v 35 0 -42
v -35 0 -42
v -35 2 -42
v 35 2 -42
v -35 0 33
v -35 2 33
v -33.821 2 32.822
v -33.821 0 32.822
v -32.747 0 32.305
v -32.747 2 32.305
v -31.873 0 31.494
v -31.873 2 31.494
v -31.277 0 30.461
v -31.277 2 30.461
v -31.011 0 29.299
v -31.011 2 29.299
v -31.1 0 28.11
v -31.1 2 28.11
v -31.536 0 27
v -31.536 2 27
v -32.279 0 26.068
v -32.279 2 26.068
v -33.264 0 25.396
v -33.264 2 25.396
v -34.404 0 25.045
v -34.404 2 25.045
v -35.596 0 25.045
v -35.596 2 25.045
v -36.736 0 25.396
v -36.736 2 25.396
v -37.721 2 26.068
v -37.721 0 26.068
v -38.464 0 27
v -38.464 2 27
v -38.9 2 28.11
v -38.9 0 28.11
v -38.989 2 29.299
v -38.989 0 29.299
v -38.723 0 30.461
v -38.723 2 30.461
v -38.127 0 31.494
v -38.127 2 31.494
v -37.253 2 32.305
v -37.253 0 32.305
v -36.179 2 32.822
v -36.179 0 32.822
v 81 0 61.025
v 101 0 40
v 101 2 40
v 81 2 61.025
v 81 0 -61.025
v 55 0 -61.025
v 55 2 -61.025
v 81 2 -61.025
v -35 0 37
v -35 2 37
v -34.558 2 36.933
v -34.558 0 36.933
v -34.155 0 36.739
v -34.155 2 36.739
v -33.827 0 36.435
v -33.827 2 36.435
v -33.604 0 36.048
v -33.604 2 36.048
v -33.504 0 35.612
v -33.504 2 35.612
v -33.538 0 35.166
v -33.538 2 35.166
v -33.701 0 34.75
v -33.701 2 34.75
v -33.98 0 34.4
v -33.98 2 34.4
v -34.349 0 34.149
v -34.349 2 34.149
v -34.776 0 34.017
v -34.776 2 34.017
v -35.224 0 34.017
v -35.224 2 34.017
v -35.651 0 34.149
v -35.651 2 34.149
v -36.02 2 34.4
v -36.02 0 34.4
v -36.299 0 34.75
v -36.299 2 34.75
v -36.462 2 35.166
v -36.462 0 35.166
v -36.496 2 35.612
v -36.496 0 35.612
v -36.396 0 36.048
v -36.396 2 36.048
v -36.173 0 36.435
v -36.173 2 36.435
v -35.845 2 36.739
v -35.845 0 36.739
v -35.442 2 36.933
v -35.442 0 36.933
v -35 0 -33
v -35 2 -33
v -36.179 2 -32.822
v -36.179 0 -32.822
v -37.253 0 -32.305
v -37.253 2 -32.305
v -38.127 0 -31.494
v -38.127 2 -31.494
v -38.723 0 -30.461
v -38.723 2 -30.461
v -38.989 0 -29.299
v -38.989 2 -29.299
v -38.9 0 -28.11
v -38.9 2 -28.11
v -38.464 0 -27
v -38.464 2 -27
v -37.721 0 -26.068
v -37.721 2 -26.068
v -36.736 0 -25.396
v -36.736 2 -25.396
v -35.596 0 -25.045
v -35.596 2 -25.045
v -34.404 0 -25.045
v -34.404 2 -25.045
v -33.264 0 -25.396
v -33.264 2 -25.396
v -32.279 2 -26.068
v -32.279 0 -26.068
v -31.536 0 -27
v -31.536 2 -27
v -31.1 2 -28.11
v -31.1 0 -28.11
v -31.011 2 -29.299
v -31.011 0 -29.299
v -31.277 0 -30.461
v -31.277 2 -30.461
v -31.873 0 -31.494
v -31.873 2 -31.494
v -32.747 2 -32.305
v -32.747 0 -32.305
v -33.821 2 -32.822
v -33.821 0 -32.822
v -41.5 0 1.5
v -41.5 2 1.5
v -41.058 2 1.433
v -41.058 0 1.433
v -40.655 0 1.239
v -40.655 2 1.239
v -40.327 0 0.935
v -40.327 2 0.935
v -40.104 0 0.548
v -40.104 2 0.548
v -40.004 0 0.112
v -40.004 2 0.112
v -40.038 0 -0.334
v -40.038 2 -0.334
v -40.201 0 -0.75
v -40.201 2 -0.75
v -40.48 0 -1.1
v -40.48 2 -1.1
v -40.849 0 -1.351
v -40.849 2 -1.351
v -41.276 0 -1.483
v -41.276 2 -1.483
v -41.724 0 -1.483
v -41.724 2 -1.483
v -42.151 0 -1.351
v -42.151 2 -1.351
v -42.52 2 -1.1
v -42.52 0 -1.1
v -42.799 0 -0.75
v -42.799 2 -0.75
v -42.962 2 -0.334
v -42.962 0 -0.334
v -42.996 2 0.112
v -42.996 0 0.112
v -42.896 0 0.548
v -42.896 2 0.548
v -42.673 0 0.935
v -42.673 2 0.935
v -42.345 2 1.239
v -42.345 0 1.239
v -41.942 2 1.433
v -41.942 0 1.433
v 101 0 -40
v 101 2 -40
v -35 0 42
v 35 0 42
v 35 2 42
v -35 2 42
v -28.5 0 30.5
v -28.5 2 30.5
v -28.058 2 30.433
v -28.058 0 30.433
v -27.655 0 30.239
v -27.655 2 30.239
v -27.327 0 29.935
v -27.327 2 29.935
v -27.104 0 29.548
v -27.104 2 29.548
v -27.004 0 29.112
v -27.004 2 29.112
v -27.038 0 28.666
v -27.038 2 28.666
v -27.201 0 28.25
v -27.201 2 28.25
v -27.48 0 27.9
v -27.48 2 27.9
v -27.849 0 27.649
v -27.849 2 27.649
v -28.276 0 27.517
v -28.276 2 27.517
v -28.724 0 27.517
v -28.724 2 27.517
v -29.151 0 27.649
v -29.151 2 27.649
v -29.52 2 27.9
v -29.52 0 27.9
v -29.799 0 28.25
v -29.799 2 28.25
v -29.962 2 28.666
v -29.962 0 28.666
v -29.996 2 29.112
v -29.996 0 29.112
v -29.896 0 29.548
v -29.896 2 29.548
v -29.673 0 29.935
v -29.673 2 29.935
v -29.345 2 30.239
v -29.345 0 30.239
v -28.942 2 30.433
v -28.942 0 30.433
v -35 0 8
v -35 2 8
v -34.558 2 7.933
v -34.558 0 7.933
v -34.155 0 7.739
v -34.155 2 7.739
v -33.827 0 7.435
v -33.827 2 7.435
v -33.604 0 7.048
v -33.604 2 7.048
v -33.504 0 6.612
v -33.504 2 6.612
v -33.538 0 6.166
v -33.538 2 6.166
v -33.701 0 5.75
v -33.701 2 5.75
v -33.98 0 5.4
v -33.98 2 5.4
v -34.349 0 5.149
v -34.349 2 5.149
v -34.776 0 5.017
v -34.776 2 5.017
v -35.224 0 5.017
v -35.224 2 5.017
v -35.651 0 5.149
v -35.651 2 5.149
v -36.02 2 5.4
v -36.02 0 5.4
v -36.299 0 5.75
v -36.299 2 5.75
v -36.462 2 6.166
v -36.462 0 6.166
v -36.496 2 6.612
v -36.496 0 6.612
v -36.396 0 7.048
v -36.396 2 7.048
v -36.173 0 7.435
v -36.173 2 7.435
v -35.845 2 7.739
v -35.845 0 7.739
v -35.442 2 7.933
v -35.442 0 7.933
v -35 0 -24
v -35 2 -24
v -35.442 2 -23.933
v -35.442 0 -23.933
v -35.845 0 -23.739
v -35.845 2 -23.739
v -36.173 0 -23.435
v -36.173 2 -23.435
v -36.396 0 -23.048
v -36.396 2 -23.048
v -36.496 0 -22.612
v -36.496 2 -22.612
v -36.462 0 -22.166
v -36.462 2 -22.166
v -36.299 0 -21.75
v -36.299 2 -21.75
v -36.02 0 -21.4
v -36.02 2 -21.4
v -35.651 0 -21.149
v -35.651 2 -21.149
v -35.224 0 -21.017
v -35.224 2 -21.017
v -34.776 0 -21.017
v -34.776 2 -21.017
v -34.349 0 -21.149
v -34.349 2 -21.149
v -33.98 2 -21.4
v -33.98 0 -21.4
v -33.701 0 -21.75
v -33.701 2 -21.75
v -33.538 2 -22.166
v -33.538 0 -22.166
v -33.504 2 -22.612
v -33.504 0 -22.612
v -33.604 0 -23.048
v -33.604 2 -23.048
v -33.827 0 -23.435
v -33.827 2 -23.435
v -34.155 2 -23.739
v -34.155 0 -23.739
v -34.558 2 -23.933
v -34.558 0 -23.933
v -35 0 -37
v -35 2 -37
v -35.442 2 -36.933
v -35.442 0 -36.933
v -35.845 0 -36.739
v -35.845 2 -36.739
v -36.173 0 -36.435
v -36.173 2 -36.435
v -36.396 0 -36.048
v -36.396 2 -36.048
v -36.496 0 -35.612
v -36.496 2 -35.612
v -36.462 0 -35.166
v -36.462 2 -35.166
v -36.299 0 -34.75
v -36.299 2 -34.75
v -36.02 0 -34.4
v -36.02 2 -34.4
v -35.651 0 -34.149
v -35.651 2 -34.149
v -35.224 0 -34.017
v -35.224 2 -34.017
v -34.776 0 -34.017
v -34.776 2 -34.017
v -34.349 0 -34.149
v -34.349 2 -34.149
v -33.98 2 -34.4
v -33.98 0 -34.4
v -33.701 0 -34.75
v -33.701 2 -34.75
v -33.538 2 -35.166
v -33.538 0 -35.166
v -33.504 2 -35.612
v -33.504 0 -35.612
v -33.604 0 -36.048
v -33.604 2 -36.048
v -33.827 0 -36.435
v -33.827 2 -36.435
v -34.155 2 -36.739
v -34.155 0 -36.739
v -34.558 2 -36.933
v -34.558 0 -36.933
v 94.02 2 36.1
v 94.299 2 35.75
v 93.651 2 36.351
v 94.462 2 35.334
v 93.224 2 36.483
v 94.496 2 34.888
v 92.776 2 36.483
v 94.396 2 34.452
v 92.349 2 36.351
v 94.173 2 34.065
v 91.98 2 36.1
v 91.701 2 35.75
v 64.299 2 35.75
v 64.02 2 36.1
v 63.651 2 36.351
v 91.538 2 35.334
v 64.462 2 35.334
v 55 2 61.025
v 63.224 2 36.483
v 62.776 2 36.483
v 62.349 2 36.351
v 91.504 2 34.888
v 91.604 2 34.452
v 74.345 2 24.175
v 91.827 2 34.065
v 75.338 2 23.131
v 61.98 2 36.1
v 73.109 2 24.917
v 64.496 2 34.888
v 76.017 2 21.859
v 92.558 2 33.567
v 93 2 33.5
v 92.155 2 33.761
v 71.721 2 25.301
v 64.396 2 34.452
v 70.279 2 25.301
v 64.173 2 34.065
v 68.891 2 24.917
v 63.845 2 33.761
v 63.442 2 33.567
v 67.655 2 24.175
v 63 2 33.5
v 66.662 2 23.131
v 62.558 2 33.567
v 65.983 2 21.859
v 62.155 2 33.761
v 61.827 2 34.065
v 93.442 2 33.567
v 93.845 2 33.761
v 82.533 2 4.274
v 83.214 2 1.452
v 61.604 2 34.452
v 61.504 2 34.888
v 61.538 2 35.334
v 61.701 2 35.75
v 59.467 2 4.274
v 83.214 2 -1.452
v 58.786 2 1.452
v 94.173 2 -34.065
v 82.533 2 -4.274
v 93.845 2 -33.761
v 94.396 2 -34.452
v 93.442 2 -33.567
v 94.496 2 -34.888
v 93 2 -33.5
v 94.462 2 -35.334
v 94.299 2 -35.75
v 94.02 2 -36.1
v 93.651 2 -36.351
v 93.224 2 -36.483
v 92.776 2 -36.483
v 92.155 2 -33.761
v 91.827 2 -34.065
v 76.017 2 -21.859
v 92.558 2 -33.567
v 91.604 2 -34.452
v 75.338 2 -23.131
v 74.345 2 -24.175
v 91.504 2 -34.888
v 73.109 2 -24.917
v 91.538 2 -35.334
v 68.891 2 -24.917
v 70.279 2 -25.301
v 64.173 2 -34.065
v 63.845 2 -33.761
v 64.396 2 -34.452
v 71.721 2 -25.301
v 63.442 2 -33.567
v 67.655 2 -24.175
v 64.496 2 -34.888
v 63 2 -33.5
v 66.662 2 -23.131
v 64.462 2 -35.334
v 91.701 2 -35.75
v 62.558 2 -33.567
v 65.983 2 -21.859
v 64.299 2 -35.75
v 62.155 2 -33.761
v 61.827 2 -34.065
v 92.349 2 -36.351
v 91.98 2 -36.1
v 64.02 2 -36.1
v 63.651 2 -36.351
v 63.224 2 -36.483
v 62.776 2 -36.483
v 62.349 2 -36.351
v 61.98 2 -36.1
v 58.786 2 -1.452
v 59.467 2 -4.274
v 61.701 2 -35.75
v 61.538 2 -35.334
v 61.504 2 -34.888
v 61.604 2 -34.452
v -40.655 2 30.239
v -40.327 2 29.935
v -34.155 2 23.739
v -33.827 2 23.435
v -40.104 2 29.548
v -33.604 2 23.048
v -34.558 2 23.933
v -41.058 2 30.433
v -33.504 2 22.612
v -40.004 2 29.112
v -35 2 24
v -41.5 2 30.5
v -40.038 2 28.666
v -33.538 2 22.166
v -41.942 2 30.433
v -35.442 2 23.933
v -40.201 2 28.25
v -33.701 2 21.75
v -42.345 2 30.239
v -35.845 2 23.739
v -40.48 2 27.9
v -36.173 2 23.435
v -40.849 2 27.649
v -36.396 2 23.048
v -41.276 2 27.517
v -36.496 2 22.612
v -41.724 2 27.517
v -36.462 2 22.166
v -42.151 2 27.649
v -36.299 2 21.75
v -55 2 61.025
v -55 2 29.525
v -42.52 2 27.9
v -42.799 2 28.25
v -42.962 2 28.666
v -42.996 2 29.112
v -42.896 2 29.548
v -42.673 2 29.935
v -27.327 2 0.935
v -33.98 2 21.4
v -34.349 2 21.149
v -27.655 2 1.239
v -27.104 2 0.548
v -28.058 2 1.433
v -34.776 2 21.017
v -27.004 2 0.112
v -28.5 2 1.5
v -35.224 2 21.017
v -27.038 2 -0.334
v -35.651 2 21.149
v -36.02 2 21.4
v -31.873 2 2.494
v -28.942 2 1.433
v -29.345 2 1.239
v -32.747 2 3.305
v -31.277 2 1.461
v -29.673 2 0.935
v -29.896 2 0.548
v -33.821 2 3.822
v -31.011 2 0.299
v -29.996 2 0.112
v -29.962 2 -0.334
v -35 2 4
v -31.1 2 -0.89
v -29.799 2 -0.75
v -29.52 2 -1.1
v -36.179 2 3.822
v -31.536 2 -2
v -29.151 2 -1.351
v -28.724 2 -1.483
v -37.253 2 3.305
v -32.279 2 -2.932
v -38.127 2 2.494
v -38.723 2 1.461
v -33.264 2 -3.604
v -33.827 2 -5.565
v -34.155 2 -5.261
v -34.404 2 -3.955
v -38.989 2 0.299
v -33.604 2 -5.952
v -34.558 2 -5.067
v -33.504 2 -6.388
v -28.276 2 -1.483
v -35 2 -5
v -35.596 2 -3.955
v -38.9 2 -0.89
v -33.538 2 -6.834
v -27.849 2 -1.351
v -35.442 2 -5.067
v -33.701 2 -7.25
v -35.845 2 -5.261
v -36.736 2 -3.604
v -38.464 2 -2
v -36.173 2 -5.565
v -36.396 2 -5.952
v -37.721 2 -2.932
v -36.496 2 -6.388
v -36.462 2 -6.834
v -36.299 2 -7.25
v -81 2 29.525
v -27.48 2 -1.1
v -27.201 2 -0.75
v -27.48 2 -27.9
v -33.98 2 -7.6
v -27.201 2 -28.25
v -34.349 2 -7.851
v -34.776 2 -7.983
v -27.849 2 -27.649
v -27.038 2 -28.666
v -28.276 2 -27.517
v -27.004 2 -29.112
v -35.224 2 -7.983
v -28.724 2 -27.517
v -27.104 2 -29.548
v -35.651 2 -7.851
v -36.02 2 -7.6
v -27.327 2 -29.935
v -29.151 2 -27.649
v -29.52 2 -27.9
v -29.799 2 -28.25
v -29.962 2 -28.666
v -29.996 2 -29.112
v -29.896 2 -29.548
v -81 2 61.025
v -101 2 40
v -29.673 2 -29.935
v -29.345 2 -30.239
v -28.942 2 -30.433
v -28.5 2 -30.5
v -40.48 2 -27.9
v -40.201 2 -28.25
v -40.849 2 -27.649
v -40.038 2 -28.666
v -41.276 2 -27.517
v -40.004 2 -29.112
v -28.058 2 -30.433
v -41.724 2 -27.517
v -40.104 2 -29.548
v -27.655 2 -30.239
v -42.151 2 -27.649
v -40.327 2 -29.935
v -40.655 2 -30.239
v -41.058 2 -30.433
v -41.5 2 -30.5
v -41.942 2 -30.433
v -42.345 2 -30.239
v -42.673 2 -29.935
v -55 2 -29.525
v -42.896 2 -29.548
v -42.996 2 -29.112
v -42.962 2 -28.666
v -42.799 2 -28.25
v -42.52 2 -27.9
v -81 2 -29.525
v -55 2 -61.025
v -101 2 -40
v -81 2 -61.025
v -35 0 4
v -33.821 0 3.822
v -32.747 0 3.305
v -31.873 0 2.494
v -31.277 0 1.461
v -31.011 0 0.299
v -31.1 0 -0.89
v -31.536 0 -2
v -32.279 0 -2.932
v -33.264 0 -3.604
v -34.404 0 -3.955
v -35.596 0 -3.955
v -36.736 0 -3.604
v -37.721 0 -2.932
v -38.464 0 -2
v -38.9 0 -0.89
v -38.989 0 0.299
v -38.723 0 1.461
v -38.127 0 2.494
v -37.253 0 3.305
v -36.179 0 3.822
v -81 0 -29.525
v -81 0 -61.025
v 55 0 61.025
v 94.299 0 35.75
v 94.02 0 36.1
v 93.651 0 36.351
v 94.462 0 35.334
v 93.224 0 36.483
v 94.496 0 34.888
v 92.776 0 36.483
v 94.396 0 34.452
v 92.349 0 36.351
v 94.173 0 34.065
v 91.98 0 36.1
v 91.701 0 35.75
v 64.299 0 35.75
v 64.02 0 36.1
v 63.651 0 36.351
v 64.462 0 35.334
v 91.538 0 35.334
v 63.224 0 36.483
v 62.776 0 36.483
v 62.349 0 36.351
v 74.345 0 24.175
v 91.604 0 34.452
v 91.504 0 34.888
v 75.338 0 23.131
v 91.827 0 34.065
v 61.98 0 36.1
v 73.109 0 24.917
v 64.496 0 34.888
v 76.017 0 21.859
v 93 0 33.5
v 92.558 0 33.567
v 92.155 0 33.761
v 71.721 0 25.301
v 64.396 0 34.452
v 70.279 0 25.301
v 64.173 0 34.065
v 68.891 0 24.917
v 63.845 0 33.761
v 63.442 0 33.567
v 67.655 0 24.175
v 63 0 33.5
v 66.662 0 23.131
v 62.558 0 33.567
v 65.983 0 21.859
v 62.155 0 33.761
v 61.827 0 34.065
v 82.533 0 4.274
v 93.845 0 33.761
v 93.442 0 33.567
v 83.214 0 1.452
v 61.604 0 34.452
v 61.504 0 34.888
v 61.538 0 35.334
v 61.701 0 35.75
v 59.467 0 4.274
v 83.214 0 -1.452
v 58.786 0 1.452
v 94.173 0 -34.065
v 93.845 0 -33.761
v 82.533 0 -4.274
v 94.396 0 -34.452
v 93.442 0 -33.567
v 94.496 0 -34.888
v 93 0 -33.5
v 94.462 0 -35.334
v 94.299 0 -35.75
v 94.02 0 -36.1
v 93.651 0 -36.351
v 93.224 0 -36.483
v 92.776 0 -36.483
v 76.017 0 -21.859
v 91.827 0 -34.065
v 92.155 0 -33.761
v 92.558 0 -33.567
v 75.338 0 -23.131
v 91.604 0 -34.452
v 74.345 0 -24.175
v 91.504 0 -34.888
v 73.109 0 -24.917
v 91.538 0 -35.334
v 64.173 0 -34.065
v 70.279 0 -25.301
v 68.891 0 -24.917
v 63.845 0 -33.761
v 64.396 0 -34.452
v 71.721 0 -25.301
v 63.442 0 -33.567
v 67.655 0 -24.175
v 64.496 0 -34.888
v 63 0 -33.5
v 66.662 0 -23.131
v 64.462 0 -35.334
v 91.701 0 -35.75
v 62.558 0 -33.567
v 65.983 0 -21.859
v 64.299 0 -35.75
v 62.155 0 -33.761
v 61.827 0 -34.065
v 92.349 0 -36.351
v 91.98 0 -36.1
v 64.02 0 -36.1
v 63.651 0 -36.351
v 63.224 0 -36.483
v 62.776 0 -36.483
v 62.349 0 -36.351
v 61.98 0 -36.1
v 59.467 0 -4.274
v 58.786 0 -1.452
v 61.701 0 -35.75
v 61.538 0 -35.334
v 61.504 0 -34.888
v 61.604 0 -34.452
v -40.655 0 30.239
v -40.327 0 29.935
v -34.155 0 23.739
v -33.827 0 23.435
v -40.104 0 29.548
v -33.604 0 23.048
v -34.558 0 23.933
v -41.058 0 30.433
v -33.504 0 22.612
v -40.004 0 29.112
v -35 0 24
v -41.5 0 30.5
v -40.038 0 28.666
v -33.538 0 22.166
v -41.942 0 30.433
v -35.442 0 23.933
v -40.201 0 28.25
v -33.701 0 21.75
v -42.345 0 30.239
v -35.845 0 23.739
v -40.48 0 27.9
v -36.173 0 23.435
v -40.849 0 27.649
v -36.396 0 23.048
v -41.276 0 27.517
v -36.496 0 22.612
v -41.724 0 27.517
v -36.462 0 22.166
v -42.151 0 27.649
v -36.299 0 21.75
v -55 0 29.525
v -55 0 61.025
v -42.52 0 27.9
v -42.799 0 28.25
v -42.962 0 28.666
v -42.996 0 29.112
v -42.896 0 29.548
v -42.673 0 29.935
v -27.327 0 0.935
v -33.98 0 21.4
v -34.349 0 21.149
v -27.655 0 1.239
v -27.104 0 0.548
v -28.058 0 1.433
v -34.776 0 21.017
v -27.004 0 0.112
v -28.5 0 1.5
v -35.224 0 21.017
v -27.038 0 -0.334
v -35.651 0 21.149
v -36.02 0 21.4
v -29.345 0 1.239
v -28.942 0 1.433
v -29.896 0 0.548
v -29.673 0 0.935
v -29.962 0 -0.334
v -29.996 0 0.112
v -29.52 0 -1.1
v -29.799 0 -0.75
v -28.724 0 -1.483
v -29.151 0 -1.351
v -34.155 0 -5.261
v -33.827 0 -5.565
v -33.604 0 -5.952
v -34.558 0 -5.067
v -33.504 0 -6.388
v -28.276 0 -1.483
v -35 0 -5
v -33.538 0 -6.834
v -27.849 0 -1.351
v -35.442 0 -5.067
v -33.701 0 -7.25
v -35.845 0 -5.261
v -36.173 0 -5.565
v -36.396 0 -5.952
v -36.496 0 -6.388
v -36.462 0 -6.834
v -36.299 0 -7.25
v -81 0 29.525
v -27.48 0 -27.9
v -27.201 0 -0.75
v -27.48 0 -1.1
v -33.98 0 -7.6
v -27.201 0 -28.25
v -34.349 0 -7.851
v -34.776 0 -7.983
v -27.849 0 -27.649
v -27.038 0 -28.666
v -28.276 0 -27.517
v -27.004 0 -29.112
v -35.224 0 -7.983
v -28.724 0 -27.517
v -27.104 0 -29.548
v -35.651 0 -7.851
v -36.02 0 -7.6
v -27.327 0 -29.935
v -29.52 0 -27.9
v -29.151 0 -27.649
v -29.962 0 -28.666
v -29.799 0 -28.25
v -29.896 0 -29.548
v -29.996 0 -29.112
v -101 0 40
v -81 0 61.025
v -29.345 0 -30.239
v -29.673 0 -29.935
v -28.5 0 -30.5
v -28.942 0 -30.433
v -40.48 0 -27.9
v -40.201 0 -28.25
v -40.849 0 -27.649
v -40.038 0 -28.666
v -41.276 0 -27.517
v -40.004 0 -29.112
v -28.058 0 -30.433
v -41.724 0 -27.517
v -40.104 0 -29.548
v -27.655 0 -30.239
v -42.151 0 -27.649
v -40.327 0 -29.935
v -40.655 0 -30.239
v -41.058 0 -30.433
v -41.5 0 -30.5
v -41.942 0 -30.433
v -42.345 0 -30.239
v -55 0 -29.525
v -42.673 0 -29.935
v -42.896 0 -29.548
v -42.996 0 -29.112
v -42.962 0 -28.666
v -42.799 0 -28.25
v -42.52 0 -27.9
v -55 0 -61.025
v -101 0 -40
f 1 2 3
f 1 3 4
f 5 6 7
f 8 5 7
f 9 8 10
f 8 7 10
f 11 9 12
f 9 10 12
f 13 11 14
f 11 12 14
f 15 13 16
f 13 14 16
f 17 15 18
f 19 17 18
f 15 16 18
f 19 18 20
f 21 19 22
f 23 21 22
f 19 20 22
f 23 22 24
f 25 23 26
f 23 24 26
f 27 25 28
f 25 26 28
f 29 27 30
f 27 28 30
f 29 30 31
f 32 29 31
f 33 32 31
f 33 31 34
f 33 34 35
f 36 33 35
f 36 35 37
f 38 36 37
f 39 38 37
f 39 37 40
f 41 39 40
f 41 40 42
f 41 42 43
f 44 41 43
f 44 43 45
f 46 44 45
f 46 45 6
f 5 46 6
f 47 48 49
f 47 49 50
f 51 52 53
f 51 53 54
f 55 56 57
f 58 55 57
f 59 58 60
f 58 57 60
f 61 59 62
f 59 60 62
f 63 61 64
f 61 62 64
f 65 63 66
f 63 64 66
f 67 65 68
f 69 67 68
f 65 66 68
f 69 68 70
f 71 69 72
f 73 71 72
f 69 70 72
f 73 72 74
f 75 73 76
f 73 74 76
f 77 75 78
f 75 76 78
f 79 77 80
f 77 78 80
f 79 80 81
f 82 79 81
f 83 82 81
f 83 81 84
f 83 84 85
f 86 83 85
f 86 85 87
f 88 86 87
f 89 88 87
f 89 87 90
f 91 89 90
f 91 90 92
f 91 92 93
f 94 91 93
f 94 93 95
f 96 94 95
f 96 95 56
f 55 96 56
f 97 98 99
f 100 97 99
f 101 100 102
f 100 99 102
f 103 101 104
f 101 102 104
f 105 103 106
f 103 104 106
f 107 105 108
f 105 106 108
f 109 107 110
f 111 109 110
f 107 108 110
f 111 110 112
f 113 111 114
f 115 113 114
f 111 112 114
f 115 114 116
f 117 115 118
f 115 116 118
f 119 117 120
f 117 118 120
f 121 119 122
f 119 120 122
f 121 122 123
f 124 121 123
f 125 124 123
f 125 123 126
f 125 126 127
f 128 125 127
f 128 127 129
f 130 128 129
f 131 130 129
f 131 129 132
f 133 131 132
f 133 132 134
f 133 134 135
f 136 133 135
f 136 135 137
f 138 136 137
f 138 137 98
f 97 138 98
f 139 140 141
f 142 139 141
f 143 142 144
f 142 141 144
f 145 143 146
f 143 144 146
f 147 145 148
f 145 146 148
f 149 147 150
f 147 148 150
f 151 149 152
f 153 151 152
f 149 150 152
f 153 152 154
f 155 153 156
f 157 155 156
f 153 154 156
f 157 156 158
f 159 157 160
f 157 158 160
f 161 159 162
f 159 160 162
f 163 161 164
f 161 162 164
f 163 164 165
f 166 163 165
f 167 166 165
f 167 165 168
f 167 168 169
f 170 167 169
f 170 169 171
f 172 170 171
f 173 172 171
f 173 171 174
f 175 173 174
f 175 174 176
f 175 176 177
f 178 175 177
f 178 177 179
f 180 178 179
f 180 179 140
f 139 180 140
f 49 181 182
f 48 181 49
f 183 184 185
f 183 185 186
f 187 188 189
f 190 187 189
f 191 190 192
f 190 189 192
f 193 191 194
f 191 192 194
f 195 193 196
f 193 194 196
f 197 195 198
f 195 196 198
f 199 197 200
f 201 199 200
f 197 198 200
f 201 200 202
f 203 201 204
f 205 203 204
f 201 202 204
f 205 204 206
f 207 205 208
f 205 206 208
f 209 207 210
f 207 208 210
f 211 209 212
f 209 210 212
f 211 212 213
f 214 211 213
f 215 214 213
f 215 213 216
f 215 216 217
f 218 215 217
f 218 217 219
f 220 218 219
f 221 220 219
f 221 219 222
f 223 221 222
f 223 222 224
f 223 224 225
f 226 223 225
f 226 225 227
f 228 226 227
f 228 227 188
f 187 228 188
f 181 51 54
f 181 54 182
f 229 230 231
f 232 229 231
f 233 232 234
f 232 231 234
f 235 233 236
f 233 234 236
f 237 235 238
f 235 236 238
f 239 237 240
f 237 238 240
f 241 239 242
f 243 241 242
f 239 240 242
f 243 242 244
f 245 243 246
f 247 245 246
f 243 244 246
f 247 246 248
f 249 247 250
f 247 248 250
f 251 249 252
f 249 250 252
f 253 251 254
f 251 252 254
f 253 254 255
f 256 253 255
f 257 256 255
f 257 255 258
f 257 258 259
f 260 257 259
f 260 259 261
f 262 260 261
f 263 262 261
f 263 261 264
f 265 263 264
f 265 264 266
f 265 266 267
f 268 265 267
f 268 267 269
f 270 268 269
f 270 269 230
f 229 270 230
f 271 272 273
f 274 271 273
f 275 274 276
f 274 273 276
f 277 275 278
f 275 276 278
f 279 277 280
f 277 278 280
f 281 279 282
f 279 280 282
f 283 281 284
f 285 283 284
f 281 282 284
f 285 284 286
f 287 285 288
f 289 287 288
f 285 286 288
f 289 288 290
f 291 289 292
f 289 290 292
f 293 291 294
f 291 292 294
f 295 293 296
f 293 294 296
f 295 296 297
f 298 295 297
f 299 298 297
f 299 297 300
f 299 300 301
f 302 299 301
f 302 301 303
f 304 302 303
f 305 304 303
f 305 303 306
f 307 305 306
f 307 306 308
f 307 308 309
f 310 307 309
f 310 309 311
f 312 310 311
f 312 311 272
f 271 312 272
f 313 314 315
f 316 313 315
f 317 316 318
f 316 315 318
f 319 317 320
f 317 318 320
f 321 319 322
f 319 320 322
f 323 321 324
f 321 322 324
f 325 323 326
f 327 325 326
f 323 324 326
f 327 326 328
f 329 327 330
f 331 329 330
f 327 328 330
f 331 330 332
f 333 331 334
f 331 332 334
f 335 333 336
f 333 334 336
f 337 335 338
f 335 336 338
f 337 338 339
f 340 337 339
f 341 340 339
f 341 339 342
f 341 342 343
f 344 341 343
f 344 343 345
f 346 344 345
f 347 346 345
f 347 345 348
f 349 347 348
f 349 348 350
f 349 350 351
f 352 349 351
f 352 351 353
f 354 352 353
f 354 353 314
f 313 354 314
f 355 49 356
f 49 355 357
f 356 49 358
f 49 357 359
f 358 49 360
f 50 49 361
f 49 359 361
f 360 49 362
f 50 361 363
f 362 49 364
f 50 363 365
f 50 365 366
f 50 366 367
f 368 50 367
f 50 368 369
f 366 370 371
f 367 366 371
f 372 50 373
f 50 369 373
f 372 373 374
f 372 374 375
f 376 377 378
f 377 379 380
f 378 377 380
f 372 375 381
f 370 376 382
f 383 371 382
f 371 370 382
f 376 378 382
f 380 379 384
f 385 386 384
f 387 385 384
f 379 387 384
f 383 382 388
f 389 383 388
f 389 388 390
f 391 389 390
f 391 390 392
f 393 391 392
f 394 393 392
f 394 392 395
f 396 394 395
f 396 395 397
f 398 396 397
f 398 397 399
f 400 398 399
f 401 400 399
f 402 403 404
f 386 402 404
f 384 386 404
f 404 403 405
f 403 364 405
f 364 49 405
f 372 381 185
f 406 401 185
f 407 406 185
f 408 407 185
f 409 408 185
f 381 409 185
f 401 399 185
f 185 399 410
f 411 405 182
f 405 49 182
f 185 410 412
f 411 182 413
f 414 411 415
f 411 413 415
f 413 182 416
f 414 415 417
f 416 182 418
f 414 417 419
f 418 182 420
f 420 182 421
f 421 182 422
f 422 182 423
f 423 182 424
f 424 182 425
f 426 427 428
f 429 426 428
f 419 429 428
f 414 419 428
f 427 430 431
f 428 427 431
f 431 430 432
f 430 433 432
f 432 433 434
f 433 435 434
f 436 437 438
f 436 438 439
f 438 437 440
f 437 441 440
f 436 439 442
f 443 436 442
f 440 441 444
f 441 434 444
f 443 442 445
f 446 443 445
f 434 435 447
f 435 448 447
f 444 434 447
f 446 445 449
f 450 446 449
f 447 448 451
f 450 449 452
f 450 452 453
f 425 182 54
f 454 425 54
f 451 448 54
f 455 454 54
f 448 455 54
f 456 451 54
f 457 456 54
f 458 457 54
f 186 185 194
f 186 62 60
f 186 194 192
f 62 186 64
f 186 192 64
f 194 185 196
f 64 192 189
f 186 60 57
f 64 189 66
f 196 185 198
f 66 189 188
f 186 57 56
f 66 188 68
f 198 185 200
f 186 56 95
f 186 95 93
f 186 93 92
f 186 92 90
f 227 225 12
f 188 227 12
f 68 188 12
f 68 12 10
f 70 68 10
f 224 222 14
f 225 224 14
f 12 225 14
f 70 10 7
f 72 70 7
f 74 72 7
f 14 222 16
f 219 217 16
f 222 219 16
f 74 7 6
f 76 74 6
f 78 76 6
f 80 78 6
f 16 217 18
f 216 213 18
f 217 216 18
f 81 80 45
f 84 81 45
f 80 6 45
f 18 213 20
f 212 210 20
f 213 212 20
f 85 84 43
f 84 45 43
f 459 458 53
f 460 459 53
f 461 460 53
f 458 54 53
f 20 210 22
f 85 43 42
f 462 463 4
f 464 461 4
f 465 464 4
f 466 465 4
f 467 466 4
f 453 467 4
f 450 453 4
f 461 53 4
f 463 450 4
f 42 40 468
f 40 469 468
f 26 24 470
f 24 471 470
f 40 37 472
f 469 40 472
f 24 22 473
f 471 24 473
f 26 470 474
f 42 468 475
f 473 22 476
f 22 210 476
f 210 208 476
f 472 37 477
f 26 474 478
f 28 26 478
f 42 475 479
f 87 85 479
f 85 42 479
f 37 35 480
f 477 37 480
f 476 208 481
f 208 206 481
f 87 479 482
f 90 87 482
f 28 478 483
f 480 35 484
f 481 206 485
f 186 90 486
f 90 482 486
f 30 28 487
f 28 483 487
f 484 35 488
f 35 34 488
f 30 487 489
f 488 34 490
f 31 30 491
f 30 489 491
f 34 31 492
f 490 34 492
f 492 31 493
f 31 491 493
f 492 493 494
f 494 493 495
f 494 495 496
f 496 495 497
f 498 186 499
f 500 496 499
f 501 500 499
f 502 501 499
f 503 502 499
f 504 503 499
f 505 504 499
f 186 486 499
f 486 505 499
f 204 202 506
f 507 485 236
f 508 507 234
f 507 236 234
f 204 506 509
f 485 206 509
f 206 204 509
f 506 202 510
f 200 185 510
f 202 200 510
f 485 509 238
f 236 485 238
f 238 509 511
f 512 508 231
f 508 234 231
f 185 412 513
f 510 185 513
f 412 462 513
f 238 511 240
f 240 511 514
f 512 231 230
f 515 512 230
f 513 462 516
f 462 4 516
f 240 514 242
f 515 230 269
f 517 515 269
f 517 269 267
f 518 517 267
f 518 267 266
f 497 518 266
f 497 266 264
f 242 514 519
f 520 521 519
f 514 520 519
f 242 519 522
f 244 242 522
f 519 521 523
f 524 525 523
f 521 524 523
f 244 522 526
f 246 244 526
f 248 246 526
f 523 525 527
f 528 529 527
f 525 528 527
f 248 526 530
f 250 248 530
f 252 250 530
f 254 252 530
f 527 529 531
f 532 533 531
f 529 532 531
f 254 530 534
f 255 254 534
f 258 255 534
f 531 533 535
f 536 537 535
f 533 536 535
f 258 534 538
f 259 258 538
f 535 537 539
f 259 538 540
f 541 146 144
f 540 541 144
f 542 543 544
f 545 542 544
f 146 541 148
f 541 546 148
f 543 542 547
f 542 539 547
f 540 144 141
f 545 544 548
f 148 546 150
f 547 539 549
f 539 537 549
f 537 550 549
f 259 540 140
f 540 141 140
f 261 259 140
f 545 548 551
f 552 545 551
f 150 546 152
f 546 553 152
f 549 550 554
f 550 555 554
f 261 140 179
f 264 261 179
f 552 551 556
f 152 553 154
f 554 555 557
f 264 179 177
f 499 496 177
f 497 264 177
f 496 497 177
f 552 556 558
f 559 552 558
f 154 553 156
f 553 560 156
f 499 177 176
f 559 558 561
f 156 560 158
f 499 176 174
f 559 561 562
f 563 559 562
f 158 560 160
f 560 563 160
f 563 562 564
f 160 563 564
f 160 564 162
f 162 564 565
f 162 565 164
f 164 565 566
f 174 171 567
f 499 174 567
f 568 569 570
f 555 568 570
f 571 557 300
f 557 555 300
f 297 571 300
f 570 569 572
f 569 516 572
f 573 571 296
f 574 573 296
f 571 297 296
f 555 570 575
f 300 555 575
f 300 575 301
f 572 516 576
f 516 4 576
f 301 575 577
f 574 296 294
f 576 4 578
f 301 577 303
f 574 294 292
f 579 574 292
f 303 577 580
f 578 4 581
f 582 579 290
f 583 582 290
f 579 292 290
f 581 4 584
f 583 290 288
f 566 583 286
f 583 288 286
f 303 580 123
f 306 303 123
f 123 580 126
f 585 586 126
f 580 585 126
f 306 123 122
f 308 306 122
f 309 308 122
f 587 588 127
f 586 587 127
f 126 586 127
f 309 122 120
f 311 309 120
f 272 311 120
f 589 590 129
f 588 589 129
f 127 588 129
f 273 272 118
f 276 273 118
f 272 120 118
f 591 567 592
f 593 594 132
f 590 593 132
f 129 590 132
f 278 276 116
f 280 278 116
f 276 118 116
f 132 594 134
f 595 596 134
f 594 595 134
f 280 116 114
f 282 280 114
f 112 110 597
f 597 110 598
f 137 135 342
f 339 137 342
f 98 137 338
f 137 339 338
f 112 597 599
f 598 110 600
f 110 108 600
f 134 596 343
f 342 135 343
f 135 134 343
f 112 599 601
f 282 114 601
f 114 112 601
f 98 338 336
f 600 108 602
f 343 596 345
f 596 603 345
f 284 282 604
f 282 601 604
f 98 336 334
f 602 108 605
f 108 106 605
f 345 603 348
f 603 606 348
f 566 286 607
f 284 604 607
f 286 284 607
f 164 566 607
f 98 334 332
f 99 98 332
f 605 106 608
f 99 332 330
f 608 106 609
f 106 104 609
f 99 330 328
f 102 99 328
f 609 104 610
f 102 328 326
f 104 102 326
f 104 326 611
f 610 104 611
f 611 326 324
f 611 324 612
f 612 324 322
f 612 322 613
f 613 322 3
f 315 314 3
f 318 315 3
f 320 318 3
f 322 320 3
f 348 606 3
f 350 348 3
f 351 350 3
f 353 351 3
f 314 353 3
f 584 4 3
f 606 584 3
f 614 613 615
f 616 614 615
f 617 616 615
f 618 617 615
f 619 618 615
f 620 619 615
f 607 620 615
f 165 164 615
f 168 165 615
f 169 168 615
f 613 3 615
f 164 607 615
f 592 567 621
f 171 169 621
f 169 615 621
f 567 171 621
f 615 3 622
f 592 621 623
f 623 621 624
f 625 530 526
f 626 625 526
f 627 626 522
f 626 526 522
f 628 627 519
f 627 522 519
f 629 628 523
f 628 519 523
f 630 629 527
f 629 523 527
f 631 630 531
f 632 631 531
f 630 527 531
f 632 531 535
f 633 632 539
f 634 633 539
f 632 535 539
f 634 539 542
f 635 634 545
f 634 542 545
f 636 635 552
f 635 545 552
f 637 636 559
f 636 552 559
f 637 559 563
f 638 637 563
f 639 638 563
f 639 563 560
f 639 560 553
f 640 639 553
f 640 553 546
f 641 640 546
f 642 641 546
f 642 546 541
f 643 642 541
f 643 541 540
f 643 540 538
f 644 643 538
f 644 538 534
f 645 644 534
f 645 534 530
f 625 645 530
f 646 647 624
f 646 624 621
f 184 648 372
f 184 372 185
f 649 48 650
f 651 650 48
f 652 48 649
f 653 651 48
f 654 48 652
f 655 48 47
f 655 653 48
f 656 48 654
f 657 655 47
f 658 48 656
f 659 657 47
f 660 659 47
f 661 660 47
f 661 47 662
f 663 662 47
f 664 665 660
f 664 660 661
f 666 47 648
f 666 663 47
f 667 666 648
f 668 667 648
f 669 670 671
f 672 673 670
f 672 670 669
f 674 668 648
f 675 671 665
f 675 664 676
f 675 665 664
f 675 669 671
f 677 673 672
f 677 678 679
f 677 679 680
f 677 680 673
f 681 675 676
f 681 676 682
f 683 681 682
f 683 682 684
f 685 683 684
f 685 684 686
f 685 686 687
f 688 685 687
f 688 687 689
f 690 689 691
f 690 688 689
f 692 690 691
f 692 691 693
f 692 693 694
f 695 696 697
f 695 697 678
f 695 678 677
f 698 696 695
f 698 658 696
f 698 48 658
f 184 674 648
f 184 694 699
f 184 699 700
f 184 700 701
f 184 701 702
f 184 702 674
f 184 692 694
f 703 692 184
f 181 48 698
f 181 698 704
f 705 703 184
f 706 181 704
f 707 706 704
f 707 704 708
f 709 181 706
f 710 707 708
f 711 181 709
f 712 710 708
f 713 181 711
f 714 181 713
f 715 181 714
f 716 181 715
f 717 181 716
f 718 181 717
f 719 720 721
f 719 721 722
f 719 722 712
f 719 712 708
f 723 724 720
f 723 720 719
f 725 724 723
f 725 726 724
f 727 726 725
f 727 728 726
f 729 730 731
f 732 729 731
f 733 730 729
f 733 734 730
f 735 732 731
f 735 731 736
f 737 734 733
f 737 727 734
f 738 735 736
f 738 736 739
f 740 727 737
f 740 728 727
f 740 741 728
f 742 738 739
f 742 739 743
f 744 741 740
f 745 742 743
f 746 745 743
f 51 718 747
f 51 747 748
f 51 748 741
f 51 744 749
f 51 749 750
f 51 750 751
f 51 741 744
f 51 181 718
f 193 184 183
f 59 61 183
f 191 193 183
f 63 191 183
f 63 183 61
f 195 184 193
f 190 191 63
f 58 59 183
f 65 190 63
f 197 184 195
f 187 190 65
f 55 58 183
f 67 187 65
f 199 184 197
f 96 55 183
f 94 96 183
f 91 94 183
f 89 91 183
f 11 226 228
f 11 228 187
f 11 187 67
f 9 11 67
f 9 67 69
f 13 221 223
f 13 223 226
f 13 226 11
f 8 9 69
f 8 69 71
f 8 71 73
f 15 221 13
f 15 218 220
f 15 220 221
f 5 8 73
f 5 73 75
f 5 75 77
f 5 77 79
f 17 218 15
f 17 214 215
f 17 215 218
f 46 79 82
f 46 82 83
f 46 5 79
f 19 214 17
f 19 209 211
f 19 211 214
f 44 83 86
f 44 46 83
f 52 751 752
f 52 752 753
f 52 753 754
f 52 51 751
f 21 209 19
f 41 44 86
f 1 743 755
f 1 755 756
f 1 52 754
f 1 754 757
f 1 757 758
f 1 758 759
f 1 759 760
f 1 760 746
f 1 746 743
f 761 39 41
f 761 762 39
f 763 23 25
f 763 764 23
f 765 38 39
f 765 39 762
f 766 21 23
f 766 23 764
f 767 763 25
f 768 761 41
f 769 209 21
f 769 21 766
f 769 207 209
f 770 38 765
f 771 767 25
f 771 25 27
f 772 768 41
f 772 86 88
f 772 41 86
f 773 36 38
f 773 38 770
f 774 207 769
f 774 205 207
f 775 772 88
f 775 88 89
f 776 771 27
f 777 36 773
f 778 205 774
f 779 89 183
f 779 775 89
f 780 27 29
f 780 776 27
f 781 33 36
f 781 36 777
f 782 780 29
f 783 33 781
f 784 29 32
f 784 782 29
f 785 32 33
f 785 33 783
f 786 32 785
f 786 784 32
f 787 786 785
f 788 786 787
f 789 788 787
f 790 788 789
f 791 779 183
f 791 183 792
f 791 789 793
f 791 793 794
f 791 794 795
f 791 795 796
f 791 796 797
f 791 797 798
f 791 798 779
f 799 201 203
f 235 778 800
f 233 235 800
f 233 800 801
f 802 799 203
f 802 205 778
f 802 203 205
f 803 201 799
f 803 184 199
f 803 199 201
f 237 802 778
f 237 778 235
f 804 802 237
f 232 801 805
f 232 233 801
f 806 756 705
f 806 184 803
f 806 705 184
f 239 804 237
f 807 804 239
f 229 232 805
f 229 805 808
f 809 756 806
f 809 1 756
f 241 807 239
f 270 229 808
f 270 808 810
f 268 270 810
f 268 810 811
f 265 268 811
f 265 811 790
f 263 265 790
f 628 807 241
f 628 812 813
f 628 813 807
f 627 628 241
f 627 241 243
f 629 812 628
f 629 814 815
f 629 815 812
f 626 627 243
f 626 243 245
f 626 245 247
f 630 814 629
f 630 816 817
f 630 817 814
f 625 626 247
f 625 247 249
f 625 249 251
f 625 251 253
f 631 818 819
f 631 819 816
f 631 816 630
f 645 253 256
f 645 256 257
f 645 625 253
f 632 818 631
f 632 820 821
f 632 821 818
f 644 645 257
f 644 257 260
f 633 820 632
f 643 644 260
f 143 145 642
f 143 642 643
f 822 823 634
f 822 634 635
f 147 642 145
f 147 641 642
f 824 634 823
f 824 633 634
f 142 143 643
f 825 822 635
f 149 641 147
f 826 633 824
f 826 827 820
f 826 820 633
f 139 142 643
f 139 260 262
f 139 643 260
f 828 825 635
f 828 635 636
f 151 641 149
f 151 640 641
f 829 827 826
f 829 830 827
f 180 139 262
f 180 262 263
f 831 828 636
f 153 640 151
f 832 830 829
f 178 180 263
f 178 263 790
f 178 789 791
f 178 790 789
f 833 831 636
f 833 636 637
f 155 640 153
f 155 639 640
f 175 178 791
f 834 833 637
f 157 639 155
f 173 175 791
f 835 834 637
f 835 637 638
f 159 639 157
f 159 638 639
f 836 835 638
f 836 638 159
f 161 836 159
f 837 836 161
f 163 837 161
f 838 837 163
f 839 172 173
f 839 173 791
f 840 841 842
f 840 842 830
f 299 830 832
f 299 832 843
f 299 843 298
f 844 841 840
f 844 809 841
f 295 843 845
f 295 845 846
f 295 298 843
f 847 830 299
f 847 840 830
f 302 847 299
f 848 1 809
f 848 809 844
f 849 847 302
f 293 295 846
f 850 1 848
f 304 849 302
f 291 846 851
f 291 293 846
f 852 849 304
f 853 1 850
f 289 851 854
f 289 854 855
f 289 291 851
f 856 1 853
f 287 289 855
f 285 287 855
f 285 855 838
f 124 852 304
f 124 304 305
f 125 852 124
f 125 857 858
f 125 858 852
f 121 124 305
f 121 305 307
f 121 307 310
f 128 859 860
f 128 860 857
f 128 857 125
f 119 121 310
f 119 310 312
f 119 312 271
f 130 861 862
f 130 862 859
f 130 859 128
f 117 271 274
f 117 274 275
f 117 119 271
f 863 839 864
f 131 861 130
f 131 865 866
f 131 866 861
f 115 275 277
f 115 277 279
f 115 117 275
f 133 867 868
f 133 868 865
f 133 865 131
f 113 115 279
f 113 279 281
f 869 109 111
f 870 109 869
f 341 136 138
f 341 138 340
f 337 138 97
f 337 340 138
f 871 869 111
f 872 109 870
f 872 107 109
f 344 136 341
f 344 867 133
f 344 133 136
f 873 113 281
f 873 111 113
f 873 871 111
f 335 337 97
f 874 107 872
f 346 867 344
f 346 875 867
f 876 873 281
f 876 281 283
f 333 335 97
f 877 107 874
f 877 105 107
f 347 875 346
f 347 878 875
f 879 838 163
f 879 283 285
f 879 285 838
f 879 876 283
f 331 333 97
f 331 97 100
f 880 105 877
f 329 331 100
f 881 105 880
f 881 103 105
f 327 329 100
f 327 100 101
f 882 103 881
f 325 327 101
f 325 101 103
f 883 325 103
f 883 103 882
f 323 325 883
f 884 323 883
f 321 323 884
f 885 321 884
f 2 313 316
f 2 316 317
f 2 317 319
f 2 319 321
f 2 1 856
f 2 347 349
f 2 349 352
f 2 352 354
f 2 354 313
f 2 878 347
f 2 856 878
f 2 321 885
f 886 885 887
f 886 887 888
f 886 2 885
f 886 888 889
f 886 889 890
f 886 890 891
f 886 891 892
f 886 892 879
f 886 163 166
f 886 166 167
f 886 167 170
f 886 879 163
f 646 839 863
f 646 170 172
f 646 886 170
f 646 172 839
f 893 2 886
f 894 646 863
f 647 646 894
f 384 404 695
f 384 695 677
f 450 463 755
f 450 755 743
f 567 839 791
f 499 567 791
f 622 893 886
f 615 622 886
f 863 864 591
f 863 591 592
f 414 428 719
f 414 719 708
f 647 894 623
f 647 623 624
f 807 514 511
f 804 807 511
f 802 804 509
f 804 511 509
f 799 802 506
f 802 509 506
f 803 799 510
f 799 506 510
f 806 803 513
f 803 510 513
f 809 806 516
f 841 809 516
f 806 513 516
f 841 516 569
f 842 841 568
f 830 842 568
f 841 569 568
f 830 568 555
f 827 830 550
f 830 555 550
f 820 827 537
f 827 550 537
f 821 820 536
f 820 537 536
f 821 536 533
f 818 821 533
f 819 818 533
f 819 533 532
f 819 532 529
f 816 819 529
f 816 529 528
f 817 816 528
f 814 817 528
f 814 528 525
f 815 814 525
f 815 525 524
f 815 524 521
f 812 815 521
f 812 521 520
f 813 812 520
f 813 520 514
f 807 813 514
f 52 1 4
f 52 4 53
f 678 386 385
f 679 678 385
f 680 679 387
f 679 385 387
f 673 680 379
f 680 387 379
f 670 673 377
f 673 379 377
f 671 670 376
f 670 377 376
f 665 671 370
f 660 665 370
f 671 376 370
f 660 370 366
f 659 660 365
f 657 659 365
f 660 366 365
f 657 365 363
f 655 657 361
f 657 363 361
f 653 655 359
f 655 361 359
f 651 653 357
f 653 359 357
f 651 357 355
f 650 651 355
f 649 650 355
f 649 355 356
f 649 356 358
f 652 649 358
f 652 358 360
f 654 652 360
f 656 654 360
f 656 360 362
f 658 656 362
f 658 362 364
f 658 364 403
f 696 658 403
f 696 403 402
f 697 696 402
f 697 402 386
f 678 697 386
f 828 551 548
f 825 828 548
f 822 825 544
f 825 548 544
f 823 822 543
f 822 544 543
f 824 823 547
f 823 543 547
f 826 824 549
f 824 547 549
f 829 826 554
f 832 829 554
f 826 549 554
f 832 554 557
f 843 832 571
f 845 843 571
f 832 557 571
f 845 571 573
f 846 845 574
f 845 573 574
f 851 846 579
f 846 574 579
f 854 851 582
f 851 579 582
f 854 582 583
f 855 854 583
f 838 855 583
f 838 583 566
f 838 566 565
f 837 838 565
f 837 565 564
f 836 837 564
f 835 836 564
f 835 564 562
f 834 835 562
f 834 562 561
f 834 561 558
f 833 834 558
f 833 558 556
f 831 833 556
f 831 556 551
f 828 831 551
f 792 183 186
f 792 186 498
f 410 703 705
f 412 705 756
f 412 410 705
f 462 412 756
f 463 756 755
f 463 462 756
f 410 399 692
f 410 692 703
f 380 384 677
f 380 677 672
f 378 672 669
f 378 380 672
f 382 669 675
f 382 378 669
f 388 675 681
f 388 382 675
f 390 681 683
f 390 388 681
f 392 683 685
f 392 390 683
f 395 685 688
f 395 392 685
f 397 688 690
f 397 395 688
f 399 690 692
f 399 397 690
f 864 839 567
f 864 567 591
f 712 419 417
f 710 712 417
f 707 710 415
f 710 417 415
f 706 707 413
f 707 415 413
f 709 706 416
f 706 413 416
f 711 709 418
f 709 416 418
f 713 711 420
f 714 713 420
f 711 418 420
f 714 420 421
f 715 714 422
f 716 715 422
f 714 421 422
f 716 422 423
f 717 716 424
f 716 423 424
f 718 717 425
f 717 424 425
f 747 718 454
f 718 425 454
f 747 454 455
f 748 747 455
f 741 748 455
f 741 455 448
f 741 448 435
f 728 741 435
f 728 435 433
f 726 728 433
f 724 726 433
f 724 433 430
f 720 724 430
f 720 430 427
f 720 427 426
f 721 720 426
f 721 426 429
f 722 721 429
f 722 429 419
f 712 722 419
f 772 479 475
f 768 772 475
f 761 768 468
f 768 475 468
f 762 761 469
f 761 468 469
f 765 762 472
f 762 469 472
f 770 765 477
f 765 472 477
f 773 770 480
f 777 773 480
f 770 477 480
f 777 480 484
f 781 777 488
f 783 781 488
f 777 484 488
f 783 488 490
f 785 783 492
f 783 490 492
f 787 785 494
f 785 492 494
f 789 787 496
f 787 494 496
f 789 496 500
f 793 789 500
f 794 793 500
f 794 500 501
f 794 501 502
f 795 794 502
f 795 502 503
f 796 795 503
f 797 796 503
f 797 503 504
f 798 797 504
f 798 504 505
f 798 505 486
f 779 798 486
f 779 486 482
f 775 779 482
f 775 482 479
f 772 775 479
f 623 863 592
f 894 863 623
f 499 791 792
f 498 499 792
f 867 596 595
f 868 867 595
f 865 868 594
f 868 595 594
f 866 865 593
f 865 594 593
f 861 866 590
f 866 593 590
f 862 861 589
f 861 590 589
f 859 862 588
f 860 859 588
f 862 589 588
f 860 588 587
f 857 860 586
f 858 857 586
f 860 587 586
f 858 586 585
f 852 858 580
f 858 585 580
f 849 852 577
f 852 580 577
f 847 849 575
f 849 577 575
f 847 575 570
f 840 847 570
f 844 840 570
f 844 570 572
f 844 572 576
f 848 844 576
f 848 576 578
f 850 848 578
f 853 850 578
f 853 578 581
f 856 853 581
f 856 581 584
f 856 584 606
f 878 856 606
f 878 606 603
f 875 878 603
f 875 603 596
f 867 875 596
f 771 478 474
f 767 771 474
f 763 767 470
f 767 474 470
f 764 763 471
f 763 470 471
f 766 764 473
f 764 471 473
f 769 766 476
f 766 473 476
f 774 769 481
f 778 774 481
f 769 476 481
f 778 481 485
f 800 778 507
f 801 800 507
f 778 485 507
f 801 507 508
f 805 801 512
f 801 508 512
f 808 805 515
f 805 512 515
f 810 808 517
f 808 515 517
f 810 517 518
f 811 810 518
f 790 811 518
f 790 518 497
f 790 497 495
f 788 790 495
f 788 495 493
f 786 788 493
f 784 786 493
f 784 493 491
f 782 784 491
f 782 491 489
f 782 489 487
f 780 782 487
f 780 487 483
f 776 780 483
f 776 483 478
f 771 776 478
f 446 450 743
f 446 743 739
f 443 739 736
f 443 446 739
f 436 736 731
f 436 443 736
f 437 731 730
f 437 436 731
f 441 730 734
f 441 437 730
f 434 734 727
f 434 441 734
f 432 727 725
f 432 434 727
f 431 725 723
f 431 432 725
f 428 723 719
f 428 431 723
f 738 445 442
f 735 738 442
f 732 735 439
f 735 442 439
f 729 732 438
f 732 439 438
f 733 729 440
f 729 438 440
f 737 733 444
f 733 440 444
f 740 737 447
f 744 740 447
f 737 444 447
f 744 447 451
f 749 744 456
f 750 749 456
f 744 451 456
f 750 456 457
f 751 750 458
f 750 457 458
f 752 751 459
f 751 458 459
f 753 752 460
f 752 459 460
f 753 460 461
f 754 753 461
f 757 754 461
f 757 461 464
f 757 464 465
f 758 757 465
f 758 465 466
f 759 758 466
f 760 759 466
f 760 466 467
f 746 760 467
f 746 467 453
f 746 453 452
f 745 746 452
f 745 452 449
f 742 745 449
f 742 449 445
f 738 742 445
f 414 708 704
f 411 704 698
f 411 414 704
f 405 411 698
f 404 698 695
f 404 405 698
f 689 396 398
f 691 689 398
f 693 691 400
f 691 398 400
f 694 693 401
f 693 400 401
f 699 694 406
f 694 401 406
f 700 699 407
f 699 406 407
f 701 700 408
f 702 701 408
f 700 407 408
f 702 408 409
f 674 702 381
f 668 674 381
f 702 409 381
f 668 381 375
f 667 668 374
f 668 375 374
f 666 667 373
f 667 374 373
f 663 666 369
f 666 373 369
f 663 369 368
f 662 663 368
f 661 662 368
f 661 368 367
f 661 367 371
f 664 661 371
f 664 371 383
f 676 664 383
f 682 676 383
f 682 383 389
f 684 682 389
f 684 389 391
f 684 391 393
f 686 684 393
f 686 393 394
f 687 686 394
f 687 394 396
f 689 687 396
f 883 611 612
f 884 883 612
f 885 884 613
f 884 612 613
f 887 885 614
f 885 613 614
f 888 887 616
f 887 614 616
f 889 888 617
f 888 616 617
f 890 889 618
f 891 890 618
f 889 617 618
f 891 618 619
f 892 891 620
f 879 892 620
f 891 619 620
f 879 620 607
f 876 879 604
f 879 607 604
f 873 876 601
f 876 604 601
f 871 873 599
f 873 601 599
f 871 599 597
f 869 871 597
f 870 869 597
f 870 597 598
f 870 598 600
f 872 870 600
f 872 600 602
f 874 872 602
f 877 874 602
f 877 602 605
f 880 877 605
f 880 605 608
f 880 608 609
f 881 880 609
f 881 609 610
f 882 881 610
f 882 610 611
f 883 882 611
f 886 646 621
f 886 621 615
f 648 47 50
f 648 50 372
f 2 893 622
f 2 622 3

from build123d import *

# Parameters (mm, degrees)
BOSS_EXTRUDE1_DEPTH = 2
SKETCH5_W           = 26
SKETCH5_H           = 31.5
CUT_EXTRUDE3_DEPTH  = 119.021390944
CUT_EXTRUDE4_DEPTH  = 119.021390944
SKETCH8_R           = 1.5
SKETCH8_R_2         = 4
CUT_EXTRUDE5_DEPTH  = 119.021390944
SKETCH9_R           = 1.5
CUT_EXTRUDE6_DEPTH  = 119.021390944


with BuildPart() as part:
    # Sketch1 → Boss-Extrude1 (new body)
    with BuildSketch(Plane(origin=(0, 0, 0), x_dir=(1, 0, 0), z_dir=(0, 1, 0))):
        Polygon((-55, 61.024984395), (-35, 42), (35, 42), (55, 61.024984395), (81, 61.024984395), (101, 40), (101, -40), (81, -61.024984395), (55, -61.024984395), (35, -42), (-35, -42), (-55, -61.024984395), (-81, -61.024984395), (-101, -40), (-101, 40), (-81, 61.024984395), align=None)
    extrude(amount=BOSS_EXTRUDE1_DEPTH)

    # Sketch5 → Cut-Extrude3 (cut, through all)
    with BuildSketch(Plane.XZ):
        with Locations((-68, -45.274984395)):
            Rectangle(SKETCH5_W, SKETCH5_H)
        with Locations((-68, 45.274984395)):
            Rectangle(SKETCH5_W, SKETCH5_H)
    extrude(amount=-CUT_EXTRUDE3_DEPTH, mode=Mode.SUBTRACT)

    # Sketch4 → Cut-Extrude4 (cut, through all)
    with BuildSketch(Plane(origin=(0, 2, 0), x_dir=(1, 0, 0), z_dir=(0, 1, 0))):
        with BuildLine():
            Line((76.016587908, 21.859125), (82.533463787, 4.27425))
            ThreePointArc((82.533463787, 4.27425), (83.3, 0), (82.533463787, -4.27425))
            Line((82.533463787, -4.27425), (76.016587908, -21.859125))
            ThreePointArc((76.016587908, -21.859125), (71, -25.35), (65.983412092, -21.859125))
            Line((65.983412092, -21.859125), (59.466536213, -4.27425))
            ThreePointArc((59.466536213, -4.27425), (58.7, 0), (59.466536213, 4.27425))
            Line((59.466536213, 4.27425), (65.983412092, 21.859125))
            ThreePointArc((65.983412092, 21.859125), (71, 25.35), (76.016587908, 21.859125))
        make_face()
    extrude(amount=-CUT_EXTRUDE4_DEPTH, mode=Mode.SUBTRACT)

    # Sketch8 → Cut-Extrude5 (cut, through all)
    with BuildSketch(Plane(origin=(0, 2, 0), x_dir=(1, 0, 0), z_dir=(0, 1, 0))):
        with Locations(Location((-35, -22.5, 0), (0, 0, 270))):
            Circle(SKETCH8_R)
        with Locations(Location((-41.5, -29, 0), (0, 0, 270))):
            Circle(SKETCH8_R)
        with Locations(Location((-35, -35.5, 0), (0, 0, 270))):
            Circle(SKETCH8_R)
        with Locations(Location((-28.5, -29, 0), (0, 0, 270))):
            Circle(SKETCH8_R)
        with Locations(Location((-35, -29, 0), (0, 0, 270))):
            Circle(SKETCH8_R_2)
        with Locations(Location((-35, 29, 0), (0, 0, 90))):
            Circle(SKETCH8_R_2)
        with Locations(Location((-28.5, 29, 0), (0, 0, 90))):
            Circle(SKETCH8_R)
        with Locations(Location((-35, 35.5, 0), (0, 0, 90))):
            Circle(SKETCH8_R)
        with Locations(Location((-41.5, 29, 0), (0, 0, 90))):
            Circle(SKETCH8_R)
        with Locations(Location((-35, 22.5, 0), (0, 0, 90))):
            Circle(SKETCH8_R)
        with Locations(Location((-35, 0, 0), (0, 0, 270))):
            Circle(SKETCH8_R_2)
        with Locations(Location((-35, 6.5, 0), (0, 0, 270))):
            Circle(SKETCH8_R)
        with Locations(Location((-28.5, 0, 0), (0, 0, 270))):
            Circle(SKETCH8_R)
        with Locations(Location((-41.5, 0, 0), (0, 0, 270))):
            Circle(SKETCH8_R)
        with Locations(Location((-35, -6.5, 0), (0, 0, 270))):
            Circle(SKETCH8_R)
    extrude(amount=-CUT_EXTRUDE5_DEPTH, mode=Mode.SUBTRACT)

    # Sketch9 → Cut-Extrude6 (cut, through all)
    with BuildSketch(Plane(origin=(0, 2, 0), x_dir=(1, 0, 0), z_dir=(0, 1, 0))):
        with Locations(Location((93, 35, 0), (0, 0, 270))):
            Circle(SKETCH9_R)
        with Locations(Location((63, 35, 0), (0, 0, 270))):
            Circle(SKETCH9_R)
        with Locations(Location((63, -35, 0), (0, 0, 90))):
            Circle(SKETCH9_R)
        with Locations(Location((93, -35, 0), (0, 0, 90))):
            Circle(SKETCH9_R)
    extrude(amount=-CUT_EXTRUDE6_DEPTH, mode=Mode.SUBTRACT)


solid = part.part
